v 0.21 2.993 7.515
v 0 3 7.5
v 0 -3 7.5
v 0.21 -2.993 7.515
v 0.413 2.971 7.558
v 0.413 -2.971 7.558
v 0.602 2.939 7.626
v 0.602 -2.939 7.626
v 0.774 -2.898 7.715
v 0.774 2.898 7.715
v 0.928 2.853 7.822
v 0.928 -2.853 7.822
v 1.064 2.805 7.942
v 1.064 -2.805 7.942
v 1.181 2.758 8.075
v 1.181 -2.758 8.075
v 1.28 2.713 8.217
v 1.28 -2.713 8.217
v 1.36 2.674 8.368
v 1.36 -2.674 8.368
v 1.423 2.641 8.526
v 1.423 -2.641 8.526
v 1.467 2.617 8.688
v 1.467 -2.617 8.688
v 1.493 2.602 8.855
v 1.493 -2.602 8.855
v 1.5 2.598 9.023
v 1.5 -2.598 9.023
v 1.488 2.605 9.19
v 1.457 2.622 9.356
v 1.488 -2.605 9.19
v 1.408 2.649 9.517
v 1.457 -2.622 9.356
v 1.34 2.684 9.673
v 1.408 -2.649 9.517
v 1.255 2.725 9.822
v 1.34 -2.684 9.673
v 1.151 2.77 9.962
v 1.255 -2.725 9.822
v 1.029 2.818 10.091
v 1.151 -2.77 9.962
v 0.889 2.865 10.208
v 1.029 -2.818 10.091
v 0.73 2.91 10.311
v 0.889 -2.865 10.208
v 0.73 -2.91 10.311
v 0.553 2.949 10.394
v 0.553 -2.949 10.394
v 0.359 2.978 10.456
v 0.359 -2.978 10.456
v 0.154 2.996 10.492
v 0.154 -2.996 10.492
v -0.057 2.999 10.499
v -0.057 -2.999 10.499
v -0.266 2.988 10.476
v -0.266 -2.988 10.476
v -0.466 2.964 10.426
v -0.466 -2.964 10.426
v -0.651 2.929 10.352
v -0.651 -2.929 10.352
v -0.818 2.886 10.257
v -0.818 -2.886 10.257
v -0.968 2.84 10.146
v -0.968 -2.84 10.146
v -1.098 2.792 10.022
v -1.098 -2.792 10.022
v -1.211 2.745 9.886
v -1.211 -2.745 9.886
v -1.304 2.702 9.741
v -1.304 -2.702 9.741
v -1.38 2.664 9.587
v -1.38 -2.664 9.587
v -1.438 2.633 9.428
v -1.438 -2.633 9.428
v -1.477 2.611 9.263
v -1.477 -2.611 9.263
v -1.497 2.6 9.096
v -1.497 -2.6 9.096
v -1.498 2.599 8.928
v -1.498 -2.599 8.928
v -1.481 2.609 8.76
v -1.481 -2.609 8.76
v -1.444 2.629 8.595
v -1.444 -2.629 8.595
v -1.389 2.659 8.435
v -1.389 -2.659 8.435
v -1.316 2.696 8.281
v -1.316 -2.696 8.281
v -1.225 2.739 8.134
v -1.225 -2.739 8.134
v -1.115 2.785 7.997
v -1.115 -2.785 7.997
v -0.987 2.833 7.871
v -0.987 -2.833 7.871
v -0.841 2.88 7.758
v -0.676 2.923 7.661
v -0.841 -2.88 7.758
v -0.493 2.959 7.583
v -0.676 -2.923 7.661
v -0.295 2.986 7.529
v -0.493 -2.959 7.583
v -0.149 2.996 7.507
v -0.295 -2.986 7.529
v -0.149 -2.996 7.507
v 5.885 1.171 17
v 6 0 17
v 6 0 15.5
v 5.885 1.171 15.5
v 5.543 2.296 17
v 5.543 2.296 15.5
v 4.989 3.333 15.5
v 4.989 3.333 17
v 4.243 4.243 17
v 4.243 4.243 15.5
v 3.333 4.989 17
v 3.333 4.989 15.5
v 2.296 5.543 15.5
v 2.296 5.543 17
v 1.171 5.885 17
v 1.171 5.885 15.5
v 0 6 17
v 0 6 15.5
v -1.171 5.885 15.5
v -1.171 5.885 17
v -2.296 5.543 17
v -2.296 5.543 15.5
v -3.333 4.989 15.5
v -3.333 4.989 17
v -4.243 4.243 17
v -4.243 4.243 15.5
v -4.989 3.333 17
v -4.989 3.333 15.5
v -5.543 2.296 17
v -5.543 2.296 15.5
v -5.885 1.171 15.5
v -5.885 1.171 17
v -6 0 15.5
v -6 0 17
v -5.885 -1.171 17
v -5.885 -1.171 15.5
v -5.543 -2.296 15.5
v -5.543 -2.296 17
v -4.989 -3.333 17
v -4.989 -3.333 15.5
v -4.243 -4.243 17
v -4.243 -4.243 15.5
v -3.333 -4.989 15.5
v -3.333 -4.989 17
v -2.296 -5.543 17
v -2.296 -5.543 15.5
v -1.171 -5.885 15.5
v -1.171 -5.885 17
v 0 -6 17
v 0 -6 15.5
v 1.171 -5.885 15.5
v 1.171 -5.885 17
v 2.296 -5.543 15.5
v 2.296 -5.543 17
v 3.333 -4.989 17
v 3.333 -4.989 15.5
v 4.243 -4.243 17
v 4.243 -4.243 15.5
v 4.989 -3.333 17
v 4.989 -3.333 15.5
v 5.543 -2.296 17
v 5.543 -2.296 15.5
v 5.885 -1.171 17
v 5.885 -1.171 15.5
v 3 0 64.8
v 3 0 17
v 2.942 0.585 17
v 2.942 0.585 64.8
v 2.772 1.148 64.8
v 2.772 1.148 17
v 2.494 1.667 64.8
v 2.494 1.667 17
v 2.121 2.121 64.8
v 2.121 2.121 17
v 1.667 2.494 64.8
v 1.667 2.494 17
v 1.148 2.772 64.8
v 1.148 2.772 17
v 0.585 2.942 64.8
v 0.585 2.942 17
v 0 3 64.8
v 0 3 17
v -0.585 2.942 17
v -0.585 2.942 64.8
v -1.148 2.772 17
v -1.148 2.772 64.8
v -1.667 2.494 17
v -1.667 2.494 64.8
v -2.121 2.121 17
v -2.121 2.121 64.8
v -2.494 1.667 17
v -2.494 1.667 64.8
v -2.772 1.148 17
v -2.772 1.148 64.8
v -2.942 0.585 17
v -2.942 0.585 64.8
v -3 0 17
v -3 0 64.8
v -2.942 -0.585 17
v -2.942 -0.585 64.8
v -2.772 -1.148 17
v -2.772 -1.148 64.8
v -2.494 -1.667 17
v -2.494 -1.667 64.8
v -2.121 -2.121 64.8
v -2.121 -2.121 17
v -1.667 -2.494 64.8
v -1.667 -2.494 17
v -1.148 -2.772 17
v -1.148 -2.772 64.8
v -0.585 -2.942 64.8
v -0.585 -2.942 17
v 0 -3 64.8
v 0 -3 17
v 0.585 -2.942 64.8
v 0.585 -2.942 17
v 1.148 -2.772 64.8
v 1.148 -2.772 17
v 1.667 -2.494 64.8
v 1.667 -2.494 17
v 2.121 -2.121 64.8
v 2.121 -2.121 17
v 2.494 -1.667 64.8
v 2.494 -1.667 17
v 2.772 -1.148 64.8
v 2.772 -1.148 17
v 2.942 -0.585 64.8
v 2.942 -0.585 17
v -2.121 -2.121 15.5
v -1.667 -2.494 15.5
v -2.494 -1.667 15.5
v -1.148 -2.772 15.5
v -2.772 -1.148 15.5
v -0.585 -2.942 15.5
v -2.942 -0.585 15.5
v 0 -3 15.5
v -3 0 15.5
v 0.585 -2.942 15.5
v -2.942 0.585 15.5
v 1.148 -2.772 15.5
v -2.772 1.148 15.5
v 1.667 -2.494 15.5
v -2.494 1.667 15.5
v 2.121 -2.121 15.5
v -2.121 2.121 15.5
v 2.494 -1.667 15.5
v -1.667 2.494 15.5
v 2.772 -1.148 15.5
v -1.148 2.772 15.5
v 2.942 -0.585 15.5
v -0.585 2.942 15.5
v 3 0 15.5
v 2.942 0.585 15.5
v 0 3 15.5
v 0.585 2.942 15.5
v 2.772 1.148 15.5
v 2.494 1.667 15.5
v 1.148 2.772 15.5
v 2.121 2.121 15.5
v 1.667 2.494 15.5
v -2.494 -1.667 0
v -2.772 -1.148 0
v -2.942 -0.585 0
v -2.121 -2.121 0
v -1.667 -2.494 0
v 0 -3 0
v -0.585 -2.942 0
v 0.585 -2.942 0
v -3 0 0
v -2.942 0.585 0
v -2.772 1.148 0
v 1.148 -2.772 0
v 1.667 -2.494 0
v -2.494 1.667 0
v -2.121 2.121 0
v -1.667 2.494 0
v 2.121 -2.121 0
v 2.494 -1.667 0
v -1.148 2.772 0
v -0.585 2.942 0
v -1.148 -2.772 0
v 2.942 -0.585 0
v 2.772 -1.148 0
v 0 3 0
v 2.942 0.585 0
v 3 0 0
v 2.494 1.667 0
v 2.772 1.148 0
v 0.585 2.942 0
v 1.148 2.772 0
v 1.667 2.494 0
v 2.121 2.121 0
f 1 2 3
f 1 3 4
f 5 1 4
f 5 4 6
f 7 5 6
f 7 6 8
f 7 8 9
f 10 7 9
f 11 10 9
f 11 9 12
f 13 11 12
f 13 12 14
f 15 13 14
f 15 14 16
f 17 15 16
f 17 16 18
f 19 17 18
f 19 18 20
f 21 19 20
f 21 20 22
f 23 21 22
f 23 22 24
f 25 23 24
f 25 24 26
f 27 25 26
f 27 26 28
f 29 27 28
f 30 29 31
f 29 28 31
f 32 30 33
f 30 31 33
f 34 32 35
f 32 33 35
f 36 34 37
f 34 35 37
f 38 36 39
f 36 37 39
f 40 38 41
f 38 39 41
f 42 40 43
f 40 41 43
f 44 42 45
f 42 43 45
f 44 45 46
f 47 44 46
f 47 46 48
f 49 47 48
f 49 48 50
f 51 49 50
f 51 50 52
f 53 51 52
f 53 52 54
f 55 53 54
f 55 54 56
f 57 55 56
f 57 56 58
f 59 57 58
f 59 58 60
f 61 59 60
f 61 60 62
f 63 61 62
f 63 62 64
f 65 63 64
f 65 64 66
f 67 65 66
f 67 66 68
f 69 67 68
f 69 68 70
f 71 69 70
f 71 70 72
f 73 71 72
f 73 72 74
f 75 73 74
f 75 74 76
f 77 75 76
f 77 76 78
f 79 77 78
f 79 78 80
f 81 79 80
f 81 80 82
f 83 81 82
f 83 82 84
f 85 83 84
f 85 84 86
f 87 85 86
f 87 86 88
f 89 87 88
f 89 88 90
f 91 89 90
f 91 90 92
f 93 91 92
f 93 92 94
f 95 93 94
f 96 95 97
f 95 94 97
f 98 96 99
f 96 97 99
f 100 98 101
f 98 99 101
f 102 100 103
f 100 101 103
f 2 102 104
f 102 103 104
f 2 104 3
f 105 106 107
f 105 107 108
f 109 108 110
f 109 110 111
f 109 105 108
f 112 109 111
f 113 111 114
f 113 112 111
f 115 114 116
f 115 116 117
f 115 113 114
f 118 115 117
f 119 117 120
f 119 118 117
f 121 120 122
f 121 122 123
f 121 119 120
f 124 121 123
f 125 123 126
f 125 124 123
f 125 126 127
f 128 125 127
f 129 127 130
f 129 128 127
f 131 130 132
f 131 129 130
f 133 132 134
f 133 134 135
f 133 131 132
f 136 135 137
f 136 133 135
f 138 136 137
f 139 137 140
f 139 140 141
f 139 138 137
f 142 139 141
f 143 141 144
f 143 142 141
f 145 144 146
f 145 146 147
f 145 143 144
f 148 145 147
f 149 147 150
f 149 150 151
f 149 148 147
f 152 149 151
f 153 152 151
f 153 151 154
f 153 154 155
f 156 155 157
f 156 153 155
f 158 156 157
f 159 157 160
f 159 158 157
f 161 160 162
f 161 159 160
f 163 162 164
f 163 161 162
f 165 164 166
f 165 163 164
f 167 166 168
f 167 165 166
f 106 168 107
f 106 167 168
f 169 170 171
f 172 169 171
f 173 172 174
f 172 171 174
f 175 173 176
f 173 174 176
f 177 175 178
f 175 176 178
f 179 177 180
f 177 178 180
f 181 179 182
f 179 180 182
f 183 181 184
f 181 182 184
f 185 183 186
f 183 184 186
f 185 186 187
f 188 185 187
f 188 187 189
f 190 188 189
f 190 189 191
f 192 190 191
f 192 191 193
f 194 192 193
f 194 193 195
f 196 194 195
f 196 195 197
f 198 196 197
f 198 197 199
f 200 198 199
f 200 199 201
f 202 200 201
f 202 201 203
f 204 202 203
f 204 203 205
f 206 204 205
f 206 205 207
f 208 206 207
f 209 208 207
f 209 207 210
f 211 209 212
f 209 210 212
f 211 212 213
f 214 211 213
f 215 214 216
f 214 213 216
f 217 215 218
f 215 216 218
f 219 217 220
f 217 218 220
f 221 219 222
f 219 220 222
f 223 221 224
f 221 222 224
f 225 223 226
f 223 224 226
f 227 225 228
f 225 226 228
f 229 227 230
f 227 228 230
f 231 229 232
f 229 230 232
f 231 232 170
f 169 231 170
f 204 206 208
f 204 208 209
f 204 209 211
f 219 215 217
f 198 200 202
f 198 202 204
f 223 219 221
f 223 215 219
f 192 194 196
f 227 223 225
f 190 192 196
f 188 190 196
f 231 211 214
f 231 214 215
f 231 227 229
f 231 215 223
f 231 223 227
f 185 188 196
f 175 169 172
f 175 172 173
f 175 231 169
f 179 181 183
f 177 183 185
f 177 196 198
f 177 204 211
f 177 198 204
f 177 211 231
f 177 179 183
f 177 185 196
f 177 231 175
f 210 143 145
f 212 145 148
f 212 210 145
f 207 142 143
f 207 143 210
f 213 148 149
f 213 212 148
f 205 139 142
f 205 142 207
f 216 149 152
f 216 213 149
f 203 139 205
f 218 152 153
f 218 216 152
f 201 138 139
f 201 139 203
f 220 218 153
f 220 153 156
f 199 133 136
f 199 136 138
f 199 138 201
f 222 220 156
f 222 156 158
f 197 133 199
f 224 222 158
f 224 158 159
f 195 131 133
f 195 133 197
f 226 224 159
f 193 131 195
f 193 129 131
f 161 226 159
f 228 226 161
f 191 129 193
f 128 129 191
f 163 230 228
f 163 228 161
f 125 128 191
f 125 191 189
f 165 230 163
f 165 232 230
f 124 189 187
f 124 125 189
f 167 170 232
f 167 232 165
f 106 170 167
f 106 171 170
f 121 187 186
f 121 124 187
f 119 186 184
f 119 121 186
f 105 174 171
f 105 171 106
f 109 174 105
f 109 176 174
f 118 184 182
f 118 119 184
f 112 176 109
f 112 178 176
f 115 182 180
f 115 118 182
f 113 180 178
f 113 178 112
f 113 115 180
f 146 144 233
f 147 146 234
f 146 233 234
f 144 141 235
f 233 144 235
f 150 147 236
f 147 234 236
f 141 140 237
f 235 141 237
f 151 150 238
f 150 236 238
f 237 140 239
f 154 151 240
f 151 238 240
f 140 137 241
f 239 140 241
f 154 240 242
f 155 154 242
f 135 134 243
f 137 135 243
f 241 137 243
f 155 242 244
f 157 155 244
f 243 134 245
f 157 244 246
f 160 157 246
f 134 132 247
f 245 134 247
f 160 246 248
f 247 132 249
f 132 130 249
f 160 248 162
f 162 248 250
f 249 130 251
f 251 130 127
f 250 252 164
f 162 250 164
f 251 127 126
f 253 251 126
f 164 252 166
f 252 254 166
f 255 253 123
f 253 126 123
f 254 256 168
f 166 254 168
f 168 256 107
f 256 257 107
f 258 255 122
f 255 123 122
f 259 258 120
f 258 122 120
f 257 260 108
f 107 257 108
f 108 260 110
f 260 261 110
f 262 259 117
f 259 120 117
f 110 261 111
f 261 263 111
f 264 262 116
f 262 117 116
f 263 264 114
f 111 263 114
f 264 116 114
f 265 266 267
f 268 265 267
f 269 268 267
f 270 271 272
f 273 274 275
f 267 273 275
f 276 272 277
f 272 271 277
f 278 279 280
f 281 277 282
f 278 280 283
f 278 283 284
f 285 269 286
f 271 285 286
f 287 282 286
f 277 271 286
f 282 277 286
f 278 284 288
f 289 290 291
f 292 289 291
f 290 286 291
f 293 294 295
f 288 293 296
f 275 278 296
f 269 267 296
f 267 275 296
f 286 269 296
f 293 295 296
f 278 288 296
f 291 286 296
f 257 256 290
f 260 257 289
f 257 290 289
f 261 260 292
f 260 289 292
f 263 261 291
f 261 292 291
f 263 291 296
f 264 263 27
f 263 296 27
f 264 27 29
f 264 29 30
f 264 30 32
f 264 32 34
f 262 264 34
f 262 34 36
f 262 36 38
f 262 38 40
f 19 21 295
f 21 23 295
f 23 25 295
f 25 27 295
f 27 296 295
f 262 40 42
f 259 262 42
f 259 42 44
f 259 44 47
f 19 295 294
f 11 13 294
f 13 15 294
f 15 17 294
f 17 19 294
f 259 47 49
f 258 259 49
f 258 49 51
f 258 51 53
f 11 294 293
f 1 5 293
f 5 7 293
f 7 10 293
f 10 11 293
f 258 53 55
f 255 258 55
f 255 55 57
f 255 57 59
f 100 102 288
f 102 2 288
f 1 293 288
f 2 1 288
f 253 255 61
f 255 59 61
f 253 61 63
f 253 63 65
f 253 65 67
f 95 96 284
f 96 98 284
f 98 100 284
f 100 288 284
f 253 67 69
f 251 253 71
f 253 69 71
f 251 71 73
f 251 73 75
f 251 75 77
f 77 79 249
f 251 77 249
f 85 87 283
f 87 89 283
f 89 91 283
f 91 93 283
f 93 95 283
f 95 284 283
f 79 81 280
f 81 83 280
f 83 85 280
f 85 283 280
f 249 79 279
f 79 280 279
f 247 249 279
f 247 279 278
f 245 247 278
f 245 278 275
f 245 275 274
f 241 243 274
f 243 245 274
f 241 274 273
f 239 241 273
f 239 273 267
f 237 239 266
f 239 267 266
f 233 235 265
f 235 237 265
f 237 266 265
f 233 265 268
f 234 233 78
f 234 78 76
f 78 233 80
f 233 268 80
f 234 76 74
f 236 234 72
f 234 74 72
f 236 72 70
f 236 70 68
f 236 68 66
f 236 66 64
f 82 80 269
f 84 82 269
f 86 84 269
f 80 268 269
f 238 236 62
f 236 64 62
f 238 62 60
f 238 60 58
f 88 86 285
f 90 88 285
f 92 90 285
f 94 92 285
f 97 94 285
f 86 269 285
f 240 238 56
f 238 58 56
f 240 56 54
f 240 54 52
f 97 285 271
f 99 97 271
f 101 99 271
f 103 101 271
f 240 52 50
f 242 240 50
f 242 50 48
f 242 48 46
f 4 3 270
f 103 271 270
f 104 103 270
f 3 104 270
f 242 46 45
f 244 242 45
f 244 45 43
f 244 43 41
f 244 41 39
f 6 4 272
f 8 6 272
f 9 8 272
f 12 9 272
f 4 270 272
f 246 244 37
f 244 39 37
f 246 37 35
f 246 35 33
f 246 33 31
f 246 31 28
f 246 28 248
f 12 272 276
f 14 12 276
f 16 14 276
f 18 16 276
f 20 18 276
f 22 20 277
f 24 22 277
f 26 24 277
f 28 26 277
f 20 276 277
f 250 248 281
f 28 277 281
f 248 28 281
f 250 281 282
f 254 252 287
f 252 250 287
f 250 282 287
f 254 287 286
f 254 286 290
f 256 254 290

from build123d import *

# Parameters (mm, degrees)
SKETCH_1_R          = 3
EXTRUDE_1_DEPTH     = 64.8
SKETCH_2_R          = 6
EXTRUDE_2_DEPTH     = 1.5
SKETCH_10_R         = 1.5
CUT_EXTRUDE_1_DEPTH = 10


with BuildPart() as part:
    # 草图1 → 凸台-拉伸1 (new body)
    with BuildSketch(Plane.XY):
        Circle(SKETCH_1_R)
    extrude(amount=EXTRUDE_1_DEPTH)

    # 草图2 → 凸台-拉伸2 (add)
    with BuildSketch(Plane.XY.offset(17)):
        Circle(SKETCH_2_R)
    extrude(amount=-EXTRUDE_2_DEPTH)

    # 草图10 → 切除-拉伸1 (cut)
    with BuildSketch(Plane(origin=(0, -6.329883945, 9), x_dir=(-1, 0, 0), z_dir=(0, -1, 0))):
        with Locations(Location((0, 0, 0), (0, 0, 90))):
            Circle(SKETCH_10_R)
    extrude(amount=-CUT_EXTRUDE_1_DEPTH, mode=Mode.SUBTRACT)


solid = part.part
